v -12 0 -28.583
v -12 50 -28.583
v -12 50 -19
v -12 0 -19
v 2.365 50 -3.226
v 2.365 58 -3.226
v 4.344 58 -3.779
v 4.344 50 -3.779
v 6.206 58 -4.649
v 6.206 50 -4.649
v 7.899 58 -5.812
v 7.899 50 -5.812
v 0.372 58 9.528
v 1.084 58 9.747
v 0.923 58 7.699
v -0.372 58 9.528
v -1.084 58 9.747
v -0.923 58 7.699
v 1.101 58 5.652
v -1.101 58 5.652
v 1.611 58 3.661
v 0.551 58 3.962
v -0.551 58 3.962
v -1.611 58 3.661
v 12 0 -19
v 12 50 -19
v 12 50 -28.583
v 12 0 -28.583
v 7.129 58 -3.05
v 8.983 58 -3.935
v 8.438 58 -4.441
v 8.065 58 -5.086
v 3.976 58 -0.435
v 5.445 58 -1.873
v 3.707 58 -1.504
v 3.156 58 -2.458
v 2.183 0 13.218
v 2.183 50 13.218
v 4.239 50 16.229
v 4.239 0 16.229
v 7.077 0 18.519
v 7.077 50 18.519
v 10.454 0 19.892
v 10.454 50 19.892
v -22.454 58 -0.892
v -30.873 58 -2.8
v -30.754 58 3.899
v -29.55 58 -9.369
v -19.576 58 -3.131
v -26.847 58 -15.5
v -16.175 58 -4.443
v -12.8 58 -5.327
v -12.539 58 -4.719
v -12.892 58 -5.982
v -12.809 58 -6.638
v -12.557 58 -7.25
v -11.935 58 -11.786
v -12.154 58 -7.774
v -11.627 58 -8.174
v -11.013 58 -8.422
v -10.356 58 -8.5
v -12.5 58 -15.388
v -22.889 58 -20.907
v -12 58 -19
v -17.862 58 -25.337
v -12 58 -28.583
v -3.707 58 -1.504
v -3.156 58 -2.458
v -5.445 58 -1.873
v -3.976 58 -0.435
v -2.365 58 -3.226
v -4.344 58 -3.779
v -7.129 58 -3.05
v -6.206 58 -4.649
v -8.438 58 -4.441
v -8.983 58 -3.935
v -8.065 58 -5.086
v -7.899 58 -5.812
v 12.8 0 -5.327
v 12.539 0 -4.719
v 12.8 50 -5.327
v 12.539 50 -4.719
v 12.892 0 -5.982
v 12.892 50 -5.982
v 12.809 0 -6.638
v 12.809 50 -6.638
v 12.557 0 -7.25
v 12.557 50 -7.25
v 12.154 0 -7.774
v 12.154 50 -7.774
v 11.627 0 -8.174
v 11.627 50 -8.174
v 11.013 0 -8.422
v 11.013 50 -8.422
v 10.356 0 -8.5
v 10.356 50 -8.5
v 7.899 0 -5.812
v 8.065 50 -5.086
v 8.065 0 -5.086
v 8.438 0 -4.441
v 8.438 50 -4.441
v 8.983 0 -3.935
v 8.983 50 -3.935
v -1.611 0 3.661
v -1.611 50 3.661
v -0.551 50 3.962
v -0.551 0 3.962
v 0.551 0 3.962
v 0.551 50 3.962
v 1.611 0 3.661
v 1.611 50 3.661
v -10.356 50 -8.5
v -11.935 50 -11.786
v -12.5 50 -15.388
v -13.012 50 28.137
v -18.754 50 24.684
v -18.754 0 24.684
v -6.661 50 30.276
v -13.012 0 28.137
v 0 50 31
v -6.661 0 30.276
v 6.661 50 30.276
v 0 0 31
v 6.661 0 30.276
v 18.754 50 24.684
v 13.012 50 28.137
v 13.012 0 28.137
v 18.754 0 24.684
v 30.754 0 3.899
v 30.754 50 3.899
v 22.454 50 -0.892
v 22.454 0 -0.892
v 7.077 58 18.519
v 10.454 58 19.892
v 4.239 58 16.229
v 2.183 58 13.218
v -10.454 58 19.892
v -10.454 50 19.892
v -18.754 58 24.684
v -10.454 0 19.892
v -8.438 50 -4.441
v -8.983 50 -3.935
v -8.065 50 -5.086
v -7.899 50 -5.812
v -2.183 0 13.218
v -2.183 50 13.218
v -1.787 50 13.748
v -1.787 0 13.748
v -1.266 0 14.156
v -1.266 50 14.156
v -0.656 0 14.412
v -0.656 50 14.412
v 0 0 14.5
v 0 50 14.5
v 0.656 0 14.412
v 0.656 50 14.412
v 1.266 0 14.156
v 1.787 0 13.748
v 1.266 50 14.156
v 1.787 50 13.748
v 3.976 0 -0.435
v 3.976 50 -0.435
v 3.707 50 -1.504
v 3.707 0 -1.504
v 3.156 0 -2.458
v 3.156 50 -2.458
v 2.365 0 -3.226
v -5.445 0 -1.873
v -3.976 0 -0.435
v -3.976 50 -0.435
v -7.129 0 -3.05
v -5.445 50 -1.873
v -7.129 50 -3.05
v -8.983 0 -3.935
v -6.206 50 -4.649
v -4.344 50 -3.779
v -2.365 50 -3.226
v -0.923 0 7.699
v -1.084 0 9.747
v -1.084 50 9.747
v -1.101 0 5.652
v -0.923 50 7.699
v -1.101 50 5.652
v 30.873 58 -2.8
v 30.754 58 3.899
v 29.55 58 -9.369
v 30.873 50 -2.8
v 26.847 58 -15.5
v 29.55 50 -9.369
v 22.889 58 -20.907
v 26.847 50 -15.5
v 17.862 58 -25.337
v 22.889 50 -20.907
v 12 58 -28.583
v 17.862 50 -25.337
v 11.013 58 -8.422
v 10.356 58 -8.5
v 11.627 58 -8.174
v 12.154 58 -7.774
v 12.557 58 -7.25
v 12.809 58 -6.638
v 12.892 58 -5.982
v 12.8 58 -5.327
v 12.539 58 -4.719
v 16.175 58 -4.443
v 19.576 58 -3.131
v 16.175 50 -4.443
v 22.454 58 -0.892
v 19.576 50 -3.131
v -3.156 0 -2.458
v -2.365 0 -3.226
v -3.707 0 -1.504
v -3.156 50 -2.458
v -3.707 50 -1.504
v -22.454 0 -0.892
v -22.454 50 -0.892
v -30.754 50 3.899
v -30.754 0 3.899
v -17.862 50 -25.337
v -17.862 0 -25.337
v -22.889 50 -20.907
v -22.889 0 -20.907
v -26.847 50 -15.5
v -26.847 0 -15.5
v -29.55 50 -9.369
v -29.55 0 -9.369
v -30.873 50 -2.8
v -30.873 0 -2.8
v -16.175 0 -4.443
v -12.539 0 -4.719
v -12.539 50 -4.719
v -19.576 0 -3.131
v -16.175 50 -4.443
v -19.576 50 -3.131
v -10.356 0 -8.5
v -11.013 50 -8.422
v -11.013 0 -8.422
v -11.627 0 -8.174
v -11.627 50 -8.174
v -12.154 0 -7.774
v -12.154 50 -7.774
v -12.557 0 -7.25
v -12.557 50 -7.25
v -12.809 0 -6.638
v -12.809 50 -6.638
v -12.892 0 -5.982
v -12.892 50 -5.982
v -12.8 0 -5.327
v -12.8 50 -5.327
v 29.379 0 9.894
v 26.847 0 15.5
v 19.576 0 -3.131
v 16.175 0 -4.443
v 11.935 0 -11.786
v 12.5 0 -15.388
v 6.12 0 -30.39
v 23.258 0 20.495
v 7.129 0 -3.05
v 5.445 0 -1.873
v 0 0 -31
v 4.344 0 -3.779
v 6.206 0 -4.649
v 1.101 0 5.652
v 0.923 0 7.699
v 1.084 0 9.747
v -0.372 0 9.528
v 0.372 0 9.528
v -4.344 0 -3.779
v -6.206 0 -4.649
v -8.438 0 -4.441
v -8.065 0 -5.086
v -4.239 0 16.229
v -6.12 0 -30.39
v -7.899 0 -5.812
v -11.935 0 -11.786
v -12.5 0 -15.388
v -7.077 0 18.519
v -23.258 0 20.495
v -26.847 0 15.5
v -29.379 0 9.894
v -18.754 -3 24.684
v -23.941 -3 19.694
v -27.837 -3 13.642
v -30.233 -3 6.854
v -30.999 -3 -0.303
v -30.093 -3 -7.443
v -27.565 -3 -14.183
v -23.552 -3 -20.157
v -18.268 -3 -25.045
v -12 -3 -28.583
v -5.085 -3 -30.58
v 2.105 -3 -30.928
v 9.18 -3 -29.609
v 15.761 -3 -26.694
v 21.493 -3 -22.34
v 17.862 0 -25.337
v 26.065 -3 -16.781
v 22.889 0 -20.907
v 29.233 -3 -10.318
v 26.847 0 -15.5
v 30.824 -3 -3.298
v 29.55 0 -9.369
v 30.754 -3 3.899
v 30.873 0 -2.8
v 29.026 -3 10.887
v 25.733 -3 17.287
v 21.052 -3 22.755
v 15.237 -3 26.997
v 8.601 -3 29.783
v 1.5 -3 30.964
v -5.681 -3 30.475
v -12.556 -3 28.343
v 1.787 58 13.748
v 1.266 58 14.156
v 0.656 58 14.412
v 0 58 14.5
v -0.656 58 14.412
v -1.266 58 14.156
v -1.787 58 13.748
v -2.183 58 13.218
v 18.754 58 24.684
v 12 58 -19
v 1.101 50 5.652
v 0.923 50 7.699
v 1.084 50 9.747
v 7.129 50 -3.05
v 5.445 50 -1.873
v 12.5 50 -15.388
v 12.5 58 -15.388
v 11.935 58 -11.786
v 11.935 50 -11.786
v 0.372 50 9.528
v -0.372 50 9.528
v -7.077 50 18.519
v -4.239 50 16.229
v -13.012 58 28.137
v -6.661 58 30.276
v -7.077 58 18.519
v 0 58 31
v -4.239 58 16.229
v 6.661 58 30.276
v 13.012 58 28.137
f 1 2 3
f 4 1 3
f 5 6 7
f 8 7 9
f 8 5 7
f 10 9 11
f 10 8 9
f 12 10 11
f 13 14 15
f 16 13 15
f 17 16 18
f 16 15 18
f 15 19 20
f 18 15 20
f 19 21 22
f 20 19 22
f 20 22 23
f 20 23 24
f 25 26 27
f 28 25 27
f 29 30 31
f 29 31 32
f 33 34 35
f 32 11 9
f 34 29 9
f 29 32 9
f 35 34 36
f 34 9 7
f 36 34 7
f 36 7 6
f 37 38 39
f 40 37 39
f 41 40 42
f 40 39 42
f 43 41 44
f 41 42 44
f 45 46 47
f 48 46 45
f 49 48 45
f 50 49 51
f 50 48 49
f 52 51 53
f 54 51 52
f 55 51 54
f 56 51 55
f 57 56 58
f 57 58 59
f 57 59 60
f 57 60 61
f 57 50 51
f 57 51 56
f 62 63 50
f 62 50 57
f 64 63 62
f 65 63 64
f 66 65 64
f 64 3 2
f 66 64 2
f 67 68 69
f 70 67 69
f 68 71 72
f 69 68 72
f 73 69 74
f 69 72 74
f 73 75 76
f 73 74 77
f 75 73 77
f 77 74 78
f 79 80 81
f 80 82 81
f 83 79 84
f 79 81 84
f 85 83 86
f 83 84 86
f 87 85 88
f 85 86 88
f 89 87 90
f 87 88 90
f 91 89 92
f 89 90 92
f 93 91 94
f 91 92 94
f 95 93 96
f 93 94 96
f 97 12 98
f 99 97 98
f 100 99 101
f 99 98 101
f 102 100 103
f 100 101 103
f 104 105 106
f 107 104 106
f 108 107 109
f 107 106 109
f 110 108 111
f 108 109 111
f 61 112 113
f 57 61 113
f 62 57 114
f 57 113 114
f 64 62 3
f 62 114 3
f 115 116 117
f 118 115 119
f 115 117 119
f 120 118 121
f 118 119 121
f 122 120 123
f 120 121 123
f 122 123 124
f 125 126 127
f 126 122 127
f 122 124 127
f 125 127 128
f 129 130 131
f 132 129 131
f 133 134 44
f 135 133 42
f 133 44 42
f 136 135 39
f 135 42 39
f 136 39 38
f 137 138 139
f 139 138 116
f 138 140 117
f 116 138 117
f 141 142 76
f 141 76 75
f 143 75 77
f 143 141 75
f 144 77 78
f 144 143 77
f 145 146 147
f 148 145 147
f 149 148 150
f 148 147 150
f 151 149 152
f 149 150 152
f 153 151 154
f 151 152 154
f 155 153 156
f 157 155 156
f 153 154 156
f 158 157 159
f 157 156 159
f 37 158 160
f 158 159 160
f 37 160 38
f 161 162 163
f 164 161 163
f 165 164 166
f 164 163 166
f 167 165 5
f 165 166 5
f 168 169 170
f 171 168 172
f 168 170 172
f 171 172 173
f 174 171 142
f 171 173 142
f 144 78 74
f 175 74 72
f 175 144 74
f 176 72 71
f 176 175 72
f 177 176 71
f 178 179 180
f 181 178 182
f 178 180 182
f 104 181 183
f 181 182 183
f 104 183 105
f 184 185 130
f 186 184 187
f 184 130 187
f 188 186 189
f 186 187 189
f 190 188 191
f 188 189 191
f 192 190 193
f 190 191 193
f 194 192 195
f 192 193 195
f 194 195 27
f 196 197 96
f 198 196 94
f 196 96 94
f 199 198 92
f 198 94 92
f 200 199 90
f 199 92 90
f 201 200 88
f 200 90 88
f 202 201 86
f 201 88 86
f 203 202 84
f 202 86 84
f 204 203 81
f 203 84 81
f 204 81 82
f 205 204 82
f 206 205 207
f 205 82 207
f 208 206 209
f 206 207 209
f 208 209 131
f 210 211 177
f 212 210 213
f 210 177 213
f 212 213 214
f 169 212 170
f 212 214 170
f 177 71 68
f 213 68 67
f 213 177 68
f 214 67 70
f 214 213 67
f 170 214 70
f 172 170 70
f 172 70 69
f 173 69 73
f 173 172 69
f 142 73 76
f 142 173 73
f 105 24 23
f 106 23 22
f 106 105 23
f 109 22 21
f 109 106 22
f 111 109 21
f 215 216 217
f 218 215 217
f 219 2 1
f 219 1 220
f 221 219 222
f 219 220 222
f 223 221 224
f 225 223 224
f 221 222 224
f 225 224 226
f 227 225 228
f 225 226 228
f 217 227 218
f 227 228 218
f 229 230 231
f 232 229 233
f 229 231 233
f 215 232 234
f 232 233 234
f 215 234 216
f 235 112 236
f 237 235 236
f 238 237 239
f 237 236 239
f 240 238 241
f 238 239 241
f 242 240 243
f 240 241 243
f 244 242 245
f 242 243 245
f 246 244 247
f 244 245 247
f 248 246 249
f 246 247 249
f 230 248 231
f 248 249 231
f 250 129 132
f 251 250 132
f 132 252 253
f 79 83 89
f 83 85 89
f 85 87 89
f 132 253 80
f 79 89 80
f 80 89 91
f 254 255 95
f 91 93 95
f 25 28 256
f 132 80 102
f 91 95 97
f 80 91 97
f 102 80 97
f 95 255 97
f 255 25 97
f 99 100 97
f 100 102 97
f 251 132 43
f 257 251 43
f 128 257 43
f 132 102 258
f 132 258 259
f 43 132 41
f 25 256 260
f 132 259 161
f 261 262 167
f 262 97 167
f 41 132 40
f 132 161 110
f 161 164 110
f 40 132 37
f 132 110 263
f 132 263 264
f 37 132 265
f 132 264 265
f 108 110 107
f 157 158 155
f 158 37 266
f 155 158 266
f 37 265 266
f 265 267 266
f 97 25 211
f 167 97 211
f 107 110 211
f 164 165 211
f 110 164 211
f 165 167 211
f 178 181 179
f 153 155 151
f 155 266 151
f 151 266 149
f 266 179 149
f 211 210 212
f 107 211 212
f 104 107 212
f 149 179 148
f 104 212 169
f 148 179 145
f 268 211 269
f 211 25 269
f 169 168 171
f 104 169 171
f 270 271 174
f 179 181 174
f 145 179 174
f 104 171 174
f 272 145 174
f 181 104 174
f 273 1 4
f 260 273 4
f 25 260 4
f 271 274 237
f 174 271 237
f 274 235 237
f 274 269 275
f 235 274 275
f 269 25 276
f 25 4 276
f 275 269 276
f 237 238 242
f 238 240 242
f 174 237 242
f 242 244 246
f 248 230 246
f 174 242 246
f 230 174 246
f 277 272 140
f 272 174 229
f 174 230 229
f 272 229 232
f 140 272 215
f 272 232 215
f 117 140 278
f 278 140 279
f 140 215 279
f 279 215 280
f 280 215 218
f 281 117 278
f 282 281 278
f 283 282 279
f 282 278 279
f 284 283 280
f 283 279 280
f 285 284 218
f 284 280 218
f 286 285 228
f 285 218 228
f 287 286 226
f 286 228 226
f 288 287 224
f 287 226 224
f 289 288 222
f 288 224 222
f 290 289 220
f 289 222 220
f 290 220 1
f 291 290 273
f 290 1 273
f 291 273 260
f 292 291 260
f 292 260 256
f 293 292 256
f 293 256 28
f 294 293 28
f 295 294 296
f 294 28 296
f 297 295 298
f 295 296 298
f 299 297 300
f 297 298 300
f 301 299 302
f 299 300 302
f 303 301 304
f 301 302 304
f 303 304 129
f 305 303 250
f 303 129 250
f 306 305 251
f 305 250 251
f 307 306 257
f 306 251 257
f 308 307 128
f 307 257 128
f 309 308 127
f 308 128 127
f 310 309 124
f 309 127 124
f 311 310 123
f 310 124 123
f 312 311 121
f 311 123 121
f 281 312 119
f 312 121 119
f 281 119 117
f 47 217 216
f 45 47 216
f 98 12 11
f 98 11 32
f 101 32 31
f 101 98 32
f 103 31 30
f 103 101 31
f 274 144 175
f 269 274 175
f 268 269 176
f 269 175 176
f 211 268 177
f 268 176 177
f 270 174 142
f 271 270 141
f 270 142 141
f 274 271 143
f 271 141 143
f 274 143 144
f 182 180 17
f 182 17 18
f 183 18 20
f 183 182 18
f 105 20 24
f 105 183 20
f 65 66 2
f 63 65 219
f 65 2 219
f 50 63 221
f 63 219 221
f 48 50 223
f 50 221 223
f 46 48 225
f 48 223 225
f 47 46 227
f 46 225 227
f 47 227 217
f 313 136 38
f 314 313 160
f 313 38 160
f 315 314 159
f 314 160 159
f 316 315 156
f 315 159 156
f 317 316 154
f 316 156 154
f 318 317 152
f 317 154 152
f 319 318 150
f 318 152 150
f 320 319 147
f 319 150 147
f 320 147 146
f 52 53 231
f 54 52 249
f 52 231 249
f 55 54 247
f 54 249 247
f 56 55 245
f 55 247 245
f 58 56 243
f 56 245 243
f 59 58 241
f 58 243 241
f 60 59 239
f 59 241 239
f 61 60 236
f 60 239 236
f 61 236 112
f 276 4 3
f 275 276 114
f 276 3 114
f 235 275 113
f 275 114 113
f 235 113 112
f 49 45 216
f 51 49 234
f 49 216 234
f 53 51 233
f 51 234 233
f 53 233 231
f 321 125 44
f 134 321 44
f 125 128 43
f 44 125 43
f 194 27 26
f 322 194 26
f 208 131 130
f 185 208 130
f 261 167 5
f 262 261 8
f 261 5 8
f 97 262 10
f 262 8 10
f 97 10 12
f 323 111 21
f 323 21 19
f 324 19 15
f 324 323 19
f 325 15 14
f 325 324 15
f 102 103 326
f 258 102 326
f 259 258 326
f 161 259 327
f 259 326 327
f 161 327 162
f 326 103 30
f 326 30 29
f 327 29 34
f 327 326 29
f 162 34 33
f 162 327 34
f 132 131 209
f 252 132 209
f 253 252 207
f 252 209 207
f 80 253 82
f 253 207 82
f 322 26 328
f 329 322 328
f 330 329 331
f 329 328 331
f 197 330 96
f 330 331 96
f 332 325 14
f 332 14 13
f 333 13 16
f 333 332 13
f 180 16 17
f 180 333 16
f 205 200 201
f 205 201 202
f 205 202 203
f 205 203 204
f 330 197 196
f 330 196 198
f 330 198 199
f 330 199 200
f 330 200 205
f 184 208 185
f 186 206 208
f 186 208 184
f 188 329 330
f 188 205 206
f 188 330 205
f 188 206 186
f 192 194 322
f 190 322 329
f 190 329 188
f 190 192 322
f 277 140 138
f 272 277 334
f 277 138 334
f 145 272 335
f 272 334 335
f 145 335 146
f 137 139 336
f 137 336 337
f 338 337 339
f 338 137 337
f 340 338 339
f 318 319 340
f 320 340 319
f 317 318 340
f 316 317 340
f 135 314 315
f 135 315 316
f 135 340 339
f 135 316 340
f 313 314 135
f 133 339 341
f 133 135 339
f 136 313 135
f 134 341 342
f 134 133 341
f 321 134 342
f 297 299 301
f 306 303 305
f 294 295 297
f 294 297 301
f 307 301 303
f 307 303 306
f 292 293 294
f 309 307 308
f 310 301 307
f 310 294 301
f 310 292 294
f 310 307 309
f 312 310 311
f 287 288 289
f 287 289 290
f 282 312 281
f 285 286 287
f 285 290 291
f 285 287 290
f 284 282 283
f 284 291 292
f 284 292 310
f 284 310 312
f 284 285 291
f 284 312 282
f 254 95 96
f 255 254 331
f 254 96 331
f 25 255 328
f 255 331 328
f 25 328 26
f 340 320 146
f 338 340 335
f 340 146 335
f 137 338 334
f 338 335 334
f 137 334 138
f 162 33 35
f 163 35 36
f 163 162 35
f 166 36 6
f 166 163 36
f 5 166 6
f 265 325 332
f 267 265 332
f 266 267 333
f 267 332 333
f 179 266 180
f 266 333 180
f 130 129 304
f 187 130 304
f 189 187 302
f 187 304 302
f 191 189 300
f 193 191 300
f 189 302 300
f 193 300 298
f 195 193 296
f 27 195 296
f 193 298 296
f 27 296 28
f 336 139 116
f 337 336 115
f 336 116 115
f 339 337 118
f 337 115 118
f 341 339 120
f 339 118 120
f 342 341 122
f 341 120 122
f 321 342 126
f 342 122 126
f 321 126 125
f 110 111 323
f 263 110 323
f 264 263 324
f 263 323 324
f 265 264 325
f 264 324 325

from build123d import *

# Parameters (mm, degrees)
SKETCH1_R           = 31
BOSS_EXTRUDE1_DEPTH = 50
SKETCH2_R           = 12.5
CUT_EXTRUDE1_DEPTH  = 50
CUT_EXTRUDE2_DEPTH  = 50
SKETCH4_R           = 4
SKETCH4_R_2         = 2.5
CUT_EXTRUDE3_DEPTH  = 67.498120274
SKETCH6_R           = 31
BOSS_EXTRUDE2_DEPTH = 3
BOSS_EXTRUDE3_DEPTH = 8


with BuildPart() as part:
    # Sketch1 → Boss-Extrude1 (new body)
    with BuildSketch(Plane(origin=(0, 0, 0), x_dir=(1, 0, 0), z_dir=(0, 1, 0))):
        with Locations(Location((0, 0, 0), (0, 0, 270))):
            Circle(SKETCH1_R)
    extrude(amount=BOSS_EXTRUDE1_DEPTH)

    # Sketch2 → Cut-Extrude1 (cut)
    with BuildSketch(Plane(origin=(0, 50, 0), x_dir=(1, 0, 0), z_dir=(0, 1, 0))):
        with Locations(Location((0, 15.5, 0), (0, 0, 270))):
            Circle(SKETCH2_R)
        with Locations(Location((13.423393759, -7.75, 0), (0, 0, 270))):
            Circle(SKETCH2_R)
        with Locations(Location((-13.423393759, -7.75, 0), (0, 0, 270))):
            Circle(SKETCH2_R)
    extrude(amount=-CUT_EXTRUDE1_DEPTH, mode=Mode.SUBTRACT)

    # Sketch3 → Cut-Extrude2 (cut)
    with BuildSketch(Plane(origin=(0, 50, 0), x_dir=(1, 0, 0), z_dir=(0, 1, 0))):
        with BuildLine():
            ThreePointArc((-12, 19), (0, 28), (12, 19))
            Line((12, 19), (12, 28.583211856))
            ThreePointArc((12, 28.583211856), (0, 31), (-12, 28.583211856))
            Line((-12, 28.583211856), (-12, 19))
        make_face()
        with BuildLine():
            ThreePointArc((18.753787589, -24.683910773), (26.846787517, -15.5), (30.753787589, -3.899301083))
            Line((30.753787589, -3.899301083), (22.454482672, 0.892304845))
            ThreePointArc((22.454482672, 0.892304845), (24.248711306, -14), (10.454482672, -19.892304845))
            Line((10.454482672, -19.892304845), (18.753787589, -24.683910773))
        make_face()
        with BuildLine():
            Line((-22.454482672, 0.892304845), (-30.753787589, -3.899301083))
            ThreePointArc((-30.753787589, -3.899301083), (-26.846787517, -15.5), (-18.753787589, -24.683910773))
            Line((-18.753787589, -24.683910773), (-10.454482672, -19.892304845))
            ThreePointArc((-10.454482672, -19.892304845), (-24.248711306, -14), (-22.454482672, 0.892304845))
        make_face()
    extrude(amount=-CUT_EXTRUDE2_DEPTH, mode=Mode.SUBTRACT)

    # Sketch4 → Cut-Extrude3 (cut, through all)
    with BuildSketch(Plane(origin=(0, 50, 0), x_dir=(1, 0, 0), z_dir=(0, 1, 0))):
        Circle(SKETCH4_R)
        with Locations((-10.392304845, 6)):
            Circle(SKETCH4_R_2)
        with Locations((10.392304845, 6)):
            Circle(SKETCH4_R_2)
        with Locations((0, -12)):
            Circle(SKETCH4_R_2)
    extrude(amount=-CUT_EXTRUDE3_DEPTH, mode=Mode.SUBTRACT)


with BuildPart() as cut_extrude3_piece_1:
    # of the separate pieces the step leaves, piece 1, a body of its own (cut_extrude3_pieces)
    add(part.part.solids().sort_by_distance((-12.538976962, 0, -4.718673022))[0])



with BuildPart() as cut_extrude3_piece_2:
    # of the separate pieces the step leaves, piece 2, a body of its own (cut_extrude3_pieces)
    add(part.part.solids().sort_by_distance((-18.753787589, 0, 24.683910773))[0])


with BuildPart() as cut_extrude3_piece_3:
    # of the separate pieces the step leaves, piece 3, a body of its own (cut_extrude3_pieces)
    add(part.part.solids().sort_by_distance((12.538976962, 0, -4.718673022))[0])


with BuildPart() as cut_extrude3_piece_4:
    # of the separate pieces the step leaves, piece 4, a body of its own (cut_extrude3_pieces)
    add(part.part.solids().sort_by_distance((3.976230514, 0, -0.43542037))[0])


with BuildPart() as cut_extrude3_piece_5:
    # of the separate pieces the step leaves, piece 5, a body of its own (cut_extrude3_pieces)
    add(part.part.solids().sort_by_distance((-3.976230514, 0, -0.43542037))[0])


with BuildPart() as cut_extrude3_piece_6:
    # of the separate pieces the step leaves, piece 6, a body of its own (cut_extrude3_pieces)
    add(part.part.solids().sort_by_distance((-1.083982046, 0, 9.747227725))[0])


with BuildPart() as cut_extrude3_piece_1_1:
    add(cut_extrude3_piece_1.part)

    add(cut_extrude3_piece_2.part)  # Boss-Extrude2 merges Cut-Extrude3 piece 2

    add(cut_extrude3_piece_3.part)  # Boss-Extrude2 merges Cut-Extrude3 piece 3

    add(cut_extrude3_piece_4.part)  # Boss-Extrude2 merges Cut-Extrude3 piece 4

    add(cut_extrude3_piece_5.part)  # Boss-Extrude2 merges Cut-Extrude3 piece 5

    add(cut_extrude3_piece_6.part)  # Boss-Extrude2 merges Cut-Extrude3 piece 6
    # Sketch6 → Boss-Extrude2 (add)
    with BuildSketch(Plane.XZ):
        with Locations(Location((0, 0, 0), (0, 0, 127.226027599))):
            Circle(SKETCH6_R)
    extrude(amount=BOSS_EXTRUDE2_DEPTH)

    # Sketch7 → Boss-Extrude3 (add)
    with BuildSketch(Plane(origin=(0, 50, 0), x_dir=(1, 0, 0), z_dir=(0, 1, 0))):
        with BuildLine():
            Line((-10.454482672, -19.892304845), (-18.753787589, -24.683910773))
            ThreePointArc((-18.753787589, -24.683910773), (0, -31), (18.753787589, -24.683910773))
            Line((18.753787589, -24.683910773), (10.454482672, -19.892304845))
            ThreePointArc((10.454482672, -19.892304845), (5.574105702, -17.478241208), (2.182997772, -13.218409097))
            ThreePointArc((2.182997772, -13.218409097), (0, -14.5), (-2.182997772, -13.218409097))
            ThreePointArc((-2.182997772, -13.218409097), (-5.574105702, -17.478241208), (-10.454482672, -19.892304845))
        make_face()
        with BuildLine():
            Line((22.454482672, 0.892304845), (30.753787589, -3.899301083))
            ThreePointArc((30.753787589, -3.899301083), (26.846787517, 15.5), (12, 28.583211856))
            Line((12, 28.583211856), (12, 19))
            ThreePointArc((12, 19), (12.349548049, 13.566437746), (10.35597919, 8.499736075))
            ThreePointArc((10.35597919, 8.499736075), (12.557368355, 7.25), (12.538976962, 4.718673022))
            ThreePointArc((12.538976962, 4.718673022), (17.923653751, 3.911803463), (22.454482672, 0.892304845))
        make_face()
        with BuildLine():
            Line((-12, 19), (-12, 28.583211856))
            ThreePointArc((-12, 28.583211856), (-26.846787517, 15.5), (-30.753787589, -3.899301083))
            Line((-30.753787589, -3.899301083), (-22.454482672, 0.892304845))
            ThreePointArc((-22.454482672, 0.892304845), (-17.923653751, 3.911803463), (-12.538976962, 4.718673022))
            ThreePointArc((-12.538976962, 4.718673022), (-12.557368355, 7.25), (-10.35597919, 8.499736075))
            ThreePointArc((-10.35597919, 8.499736075), (-12.349548049, 13.566437746), (-12, 19))
        make_face()
        with BuildLine():
            ThreePointArc((1.083982046, -9.747227725), (0, -9.5), (-1.083982046, -9.747227725))
            ThreePointArc((-1.083982046, -9.747227725), (-0.97000408, -6.671535571), (-1.611030155, -3.661226821))
            ThreePointArc((-1.611030155, -3.661226821), (0, -4), (1.611030155, -3.661226821))
            ThreePointArc((1.611030155, -3.661226821), (0.97000408, -6.671535571), (1.083982046, -9.747227725))
        make_face()
        with BuildLine():
            ThreePointArc((7.899355803, 5.812369851), (8.227241336, 4.75), (8.983337849, 3.934857873))
            ThreePointArc((8.983337849, 3.934857873), (6.262721327, 2.49571961), (3.976230514, 0.43542037))
            ThreePointArc((3.976230514, 0.43542037), (3.464101615, 2), (2.365200359, 3.225806452))
            ThreePointArc((2.365200359, 3.225806452), (5.292717247, 4.175815961), (7.899355803, 5.812369851))
        make_face()
        with BuildLine():
            ThreePointArc((-8.983337849, 3.934857873), (-8.227241336, 4.75), (-7.899355803, 5.812369851))
            ThreePointArc((-7.899355803, 5.812369851), (-5.292717247, 4.175815961), (-2.365200359, 3.225806452))
            ThreePointArc((-2.365200359, 3.225806452), (-3.464101615, 2), (-3.976230514, 0.43542037))
            ThreePointArc((-3.976230514, 0.43542037), (-6.262721327, 2.49571961), (-8.983337849, 3.934857873))
        make_face()
    extrude(amount=BOSS_EXTRUDE3_DEPTH)


solid = cut_extrude3_piece_1_1.part
